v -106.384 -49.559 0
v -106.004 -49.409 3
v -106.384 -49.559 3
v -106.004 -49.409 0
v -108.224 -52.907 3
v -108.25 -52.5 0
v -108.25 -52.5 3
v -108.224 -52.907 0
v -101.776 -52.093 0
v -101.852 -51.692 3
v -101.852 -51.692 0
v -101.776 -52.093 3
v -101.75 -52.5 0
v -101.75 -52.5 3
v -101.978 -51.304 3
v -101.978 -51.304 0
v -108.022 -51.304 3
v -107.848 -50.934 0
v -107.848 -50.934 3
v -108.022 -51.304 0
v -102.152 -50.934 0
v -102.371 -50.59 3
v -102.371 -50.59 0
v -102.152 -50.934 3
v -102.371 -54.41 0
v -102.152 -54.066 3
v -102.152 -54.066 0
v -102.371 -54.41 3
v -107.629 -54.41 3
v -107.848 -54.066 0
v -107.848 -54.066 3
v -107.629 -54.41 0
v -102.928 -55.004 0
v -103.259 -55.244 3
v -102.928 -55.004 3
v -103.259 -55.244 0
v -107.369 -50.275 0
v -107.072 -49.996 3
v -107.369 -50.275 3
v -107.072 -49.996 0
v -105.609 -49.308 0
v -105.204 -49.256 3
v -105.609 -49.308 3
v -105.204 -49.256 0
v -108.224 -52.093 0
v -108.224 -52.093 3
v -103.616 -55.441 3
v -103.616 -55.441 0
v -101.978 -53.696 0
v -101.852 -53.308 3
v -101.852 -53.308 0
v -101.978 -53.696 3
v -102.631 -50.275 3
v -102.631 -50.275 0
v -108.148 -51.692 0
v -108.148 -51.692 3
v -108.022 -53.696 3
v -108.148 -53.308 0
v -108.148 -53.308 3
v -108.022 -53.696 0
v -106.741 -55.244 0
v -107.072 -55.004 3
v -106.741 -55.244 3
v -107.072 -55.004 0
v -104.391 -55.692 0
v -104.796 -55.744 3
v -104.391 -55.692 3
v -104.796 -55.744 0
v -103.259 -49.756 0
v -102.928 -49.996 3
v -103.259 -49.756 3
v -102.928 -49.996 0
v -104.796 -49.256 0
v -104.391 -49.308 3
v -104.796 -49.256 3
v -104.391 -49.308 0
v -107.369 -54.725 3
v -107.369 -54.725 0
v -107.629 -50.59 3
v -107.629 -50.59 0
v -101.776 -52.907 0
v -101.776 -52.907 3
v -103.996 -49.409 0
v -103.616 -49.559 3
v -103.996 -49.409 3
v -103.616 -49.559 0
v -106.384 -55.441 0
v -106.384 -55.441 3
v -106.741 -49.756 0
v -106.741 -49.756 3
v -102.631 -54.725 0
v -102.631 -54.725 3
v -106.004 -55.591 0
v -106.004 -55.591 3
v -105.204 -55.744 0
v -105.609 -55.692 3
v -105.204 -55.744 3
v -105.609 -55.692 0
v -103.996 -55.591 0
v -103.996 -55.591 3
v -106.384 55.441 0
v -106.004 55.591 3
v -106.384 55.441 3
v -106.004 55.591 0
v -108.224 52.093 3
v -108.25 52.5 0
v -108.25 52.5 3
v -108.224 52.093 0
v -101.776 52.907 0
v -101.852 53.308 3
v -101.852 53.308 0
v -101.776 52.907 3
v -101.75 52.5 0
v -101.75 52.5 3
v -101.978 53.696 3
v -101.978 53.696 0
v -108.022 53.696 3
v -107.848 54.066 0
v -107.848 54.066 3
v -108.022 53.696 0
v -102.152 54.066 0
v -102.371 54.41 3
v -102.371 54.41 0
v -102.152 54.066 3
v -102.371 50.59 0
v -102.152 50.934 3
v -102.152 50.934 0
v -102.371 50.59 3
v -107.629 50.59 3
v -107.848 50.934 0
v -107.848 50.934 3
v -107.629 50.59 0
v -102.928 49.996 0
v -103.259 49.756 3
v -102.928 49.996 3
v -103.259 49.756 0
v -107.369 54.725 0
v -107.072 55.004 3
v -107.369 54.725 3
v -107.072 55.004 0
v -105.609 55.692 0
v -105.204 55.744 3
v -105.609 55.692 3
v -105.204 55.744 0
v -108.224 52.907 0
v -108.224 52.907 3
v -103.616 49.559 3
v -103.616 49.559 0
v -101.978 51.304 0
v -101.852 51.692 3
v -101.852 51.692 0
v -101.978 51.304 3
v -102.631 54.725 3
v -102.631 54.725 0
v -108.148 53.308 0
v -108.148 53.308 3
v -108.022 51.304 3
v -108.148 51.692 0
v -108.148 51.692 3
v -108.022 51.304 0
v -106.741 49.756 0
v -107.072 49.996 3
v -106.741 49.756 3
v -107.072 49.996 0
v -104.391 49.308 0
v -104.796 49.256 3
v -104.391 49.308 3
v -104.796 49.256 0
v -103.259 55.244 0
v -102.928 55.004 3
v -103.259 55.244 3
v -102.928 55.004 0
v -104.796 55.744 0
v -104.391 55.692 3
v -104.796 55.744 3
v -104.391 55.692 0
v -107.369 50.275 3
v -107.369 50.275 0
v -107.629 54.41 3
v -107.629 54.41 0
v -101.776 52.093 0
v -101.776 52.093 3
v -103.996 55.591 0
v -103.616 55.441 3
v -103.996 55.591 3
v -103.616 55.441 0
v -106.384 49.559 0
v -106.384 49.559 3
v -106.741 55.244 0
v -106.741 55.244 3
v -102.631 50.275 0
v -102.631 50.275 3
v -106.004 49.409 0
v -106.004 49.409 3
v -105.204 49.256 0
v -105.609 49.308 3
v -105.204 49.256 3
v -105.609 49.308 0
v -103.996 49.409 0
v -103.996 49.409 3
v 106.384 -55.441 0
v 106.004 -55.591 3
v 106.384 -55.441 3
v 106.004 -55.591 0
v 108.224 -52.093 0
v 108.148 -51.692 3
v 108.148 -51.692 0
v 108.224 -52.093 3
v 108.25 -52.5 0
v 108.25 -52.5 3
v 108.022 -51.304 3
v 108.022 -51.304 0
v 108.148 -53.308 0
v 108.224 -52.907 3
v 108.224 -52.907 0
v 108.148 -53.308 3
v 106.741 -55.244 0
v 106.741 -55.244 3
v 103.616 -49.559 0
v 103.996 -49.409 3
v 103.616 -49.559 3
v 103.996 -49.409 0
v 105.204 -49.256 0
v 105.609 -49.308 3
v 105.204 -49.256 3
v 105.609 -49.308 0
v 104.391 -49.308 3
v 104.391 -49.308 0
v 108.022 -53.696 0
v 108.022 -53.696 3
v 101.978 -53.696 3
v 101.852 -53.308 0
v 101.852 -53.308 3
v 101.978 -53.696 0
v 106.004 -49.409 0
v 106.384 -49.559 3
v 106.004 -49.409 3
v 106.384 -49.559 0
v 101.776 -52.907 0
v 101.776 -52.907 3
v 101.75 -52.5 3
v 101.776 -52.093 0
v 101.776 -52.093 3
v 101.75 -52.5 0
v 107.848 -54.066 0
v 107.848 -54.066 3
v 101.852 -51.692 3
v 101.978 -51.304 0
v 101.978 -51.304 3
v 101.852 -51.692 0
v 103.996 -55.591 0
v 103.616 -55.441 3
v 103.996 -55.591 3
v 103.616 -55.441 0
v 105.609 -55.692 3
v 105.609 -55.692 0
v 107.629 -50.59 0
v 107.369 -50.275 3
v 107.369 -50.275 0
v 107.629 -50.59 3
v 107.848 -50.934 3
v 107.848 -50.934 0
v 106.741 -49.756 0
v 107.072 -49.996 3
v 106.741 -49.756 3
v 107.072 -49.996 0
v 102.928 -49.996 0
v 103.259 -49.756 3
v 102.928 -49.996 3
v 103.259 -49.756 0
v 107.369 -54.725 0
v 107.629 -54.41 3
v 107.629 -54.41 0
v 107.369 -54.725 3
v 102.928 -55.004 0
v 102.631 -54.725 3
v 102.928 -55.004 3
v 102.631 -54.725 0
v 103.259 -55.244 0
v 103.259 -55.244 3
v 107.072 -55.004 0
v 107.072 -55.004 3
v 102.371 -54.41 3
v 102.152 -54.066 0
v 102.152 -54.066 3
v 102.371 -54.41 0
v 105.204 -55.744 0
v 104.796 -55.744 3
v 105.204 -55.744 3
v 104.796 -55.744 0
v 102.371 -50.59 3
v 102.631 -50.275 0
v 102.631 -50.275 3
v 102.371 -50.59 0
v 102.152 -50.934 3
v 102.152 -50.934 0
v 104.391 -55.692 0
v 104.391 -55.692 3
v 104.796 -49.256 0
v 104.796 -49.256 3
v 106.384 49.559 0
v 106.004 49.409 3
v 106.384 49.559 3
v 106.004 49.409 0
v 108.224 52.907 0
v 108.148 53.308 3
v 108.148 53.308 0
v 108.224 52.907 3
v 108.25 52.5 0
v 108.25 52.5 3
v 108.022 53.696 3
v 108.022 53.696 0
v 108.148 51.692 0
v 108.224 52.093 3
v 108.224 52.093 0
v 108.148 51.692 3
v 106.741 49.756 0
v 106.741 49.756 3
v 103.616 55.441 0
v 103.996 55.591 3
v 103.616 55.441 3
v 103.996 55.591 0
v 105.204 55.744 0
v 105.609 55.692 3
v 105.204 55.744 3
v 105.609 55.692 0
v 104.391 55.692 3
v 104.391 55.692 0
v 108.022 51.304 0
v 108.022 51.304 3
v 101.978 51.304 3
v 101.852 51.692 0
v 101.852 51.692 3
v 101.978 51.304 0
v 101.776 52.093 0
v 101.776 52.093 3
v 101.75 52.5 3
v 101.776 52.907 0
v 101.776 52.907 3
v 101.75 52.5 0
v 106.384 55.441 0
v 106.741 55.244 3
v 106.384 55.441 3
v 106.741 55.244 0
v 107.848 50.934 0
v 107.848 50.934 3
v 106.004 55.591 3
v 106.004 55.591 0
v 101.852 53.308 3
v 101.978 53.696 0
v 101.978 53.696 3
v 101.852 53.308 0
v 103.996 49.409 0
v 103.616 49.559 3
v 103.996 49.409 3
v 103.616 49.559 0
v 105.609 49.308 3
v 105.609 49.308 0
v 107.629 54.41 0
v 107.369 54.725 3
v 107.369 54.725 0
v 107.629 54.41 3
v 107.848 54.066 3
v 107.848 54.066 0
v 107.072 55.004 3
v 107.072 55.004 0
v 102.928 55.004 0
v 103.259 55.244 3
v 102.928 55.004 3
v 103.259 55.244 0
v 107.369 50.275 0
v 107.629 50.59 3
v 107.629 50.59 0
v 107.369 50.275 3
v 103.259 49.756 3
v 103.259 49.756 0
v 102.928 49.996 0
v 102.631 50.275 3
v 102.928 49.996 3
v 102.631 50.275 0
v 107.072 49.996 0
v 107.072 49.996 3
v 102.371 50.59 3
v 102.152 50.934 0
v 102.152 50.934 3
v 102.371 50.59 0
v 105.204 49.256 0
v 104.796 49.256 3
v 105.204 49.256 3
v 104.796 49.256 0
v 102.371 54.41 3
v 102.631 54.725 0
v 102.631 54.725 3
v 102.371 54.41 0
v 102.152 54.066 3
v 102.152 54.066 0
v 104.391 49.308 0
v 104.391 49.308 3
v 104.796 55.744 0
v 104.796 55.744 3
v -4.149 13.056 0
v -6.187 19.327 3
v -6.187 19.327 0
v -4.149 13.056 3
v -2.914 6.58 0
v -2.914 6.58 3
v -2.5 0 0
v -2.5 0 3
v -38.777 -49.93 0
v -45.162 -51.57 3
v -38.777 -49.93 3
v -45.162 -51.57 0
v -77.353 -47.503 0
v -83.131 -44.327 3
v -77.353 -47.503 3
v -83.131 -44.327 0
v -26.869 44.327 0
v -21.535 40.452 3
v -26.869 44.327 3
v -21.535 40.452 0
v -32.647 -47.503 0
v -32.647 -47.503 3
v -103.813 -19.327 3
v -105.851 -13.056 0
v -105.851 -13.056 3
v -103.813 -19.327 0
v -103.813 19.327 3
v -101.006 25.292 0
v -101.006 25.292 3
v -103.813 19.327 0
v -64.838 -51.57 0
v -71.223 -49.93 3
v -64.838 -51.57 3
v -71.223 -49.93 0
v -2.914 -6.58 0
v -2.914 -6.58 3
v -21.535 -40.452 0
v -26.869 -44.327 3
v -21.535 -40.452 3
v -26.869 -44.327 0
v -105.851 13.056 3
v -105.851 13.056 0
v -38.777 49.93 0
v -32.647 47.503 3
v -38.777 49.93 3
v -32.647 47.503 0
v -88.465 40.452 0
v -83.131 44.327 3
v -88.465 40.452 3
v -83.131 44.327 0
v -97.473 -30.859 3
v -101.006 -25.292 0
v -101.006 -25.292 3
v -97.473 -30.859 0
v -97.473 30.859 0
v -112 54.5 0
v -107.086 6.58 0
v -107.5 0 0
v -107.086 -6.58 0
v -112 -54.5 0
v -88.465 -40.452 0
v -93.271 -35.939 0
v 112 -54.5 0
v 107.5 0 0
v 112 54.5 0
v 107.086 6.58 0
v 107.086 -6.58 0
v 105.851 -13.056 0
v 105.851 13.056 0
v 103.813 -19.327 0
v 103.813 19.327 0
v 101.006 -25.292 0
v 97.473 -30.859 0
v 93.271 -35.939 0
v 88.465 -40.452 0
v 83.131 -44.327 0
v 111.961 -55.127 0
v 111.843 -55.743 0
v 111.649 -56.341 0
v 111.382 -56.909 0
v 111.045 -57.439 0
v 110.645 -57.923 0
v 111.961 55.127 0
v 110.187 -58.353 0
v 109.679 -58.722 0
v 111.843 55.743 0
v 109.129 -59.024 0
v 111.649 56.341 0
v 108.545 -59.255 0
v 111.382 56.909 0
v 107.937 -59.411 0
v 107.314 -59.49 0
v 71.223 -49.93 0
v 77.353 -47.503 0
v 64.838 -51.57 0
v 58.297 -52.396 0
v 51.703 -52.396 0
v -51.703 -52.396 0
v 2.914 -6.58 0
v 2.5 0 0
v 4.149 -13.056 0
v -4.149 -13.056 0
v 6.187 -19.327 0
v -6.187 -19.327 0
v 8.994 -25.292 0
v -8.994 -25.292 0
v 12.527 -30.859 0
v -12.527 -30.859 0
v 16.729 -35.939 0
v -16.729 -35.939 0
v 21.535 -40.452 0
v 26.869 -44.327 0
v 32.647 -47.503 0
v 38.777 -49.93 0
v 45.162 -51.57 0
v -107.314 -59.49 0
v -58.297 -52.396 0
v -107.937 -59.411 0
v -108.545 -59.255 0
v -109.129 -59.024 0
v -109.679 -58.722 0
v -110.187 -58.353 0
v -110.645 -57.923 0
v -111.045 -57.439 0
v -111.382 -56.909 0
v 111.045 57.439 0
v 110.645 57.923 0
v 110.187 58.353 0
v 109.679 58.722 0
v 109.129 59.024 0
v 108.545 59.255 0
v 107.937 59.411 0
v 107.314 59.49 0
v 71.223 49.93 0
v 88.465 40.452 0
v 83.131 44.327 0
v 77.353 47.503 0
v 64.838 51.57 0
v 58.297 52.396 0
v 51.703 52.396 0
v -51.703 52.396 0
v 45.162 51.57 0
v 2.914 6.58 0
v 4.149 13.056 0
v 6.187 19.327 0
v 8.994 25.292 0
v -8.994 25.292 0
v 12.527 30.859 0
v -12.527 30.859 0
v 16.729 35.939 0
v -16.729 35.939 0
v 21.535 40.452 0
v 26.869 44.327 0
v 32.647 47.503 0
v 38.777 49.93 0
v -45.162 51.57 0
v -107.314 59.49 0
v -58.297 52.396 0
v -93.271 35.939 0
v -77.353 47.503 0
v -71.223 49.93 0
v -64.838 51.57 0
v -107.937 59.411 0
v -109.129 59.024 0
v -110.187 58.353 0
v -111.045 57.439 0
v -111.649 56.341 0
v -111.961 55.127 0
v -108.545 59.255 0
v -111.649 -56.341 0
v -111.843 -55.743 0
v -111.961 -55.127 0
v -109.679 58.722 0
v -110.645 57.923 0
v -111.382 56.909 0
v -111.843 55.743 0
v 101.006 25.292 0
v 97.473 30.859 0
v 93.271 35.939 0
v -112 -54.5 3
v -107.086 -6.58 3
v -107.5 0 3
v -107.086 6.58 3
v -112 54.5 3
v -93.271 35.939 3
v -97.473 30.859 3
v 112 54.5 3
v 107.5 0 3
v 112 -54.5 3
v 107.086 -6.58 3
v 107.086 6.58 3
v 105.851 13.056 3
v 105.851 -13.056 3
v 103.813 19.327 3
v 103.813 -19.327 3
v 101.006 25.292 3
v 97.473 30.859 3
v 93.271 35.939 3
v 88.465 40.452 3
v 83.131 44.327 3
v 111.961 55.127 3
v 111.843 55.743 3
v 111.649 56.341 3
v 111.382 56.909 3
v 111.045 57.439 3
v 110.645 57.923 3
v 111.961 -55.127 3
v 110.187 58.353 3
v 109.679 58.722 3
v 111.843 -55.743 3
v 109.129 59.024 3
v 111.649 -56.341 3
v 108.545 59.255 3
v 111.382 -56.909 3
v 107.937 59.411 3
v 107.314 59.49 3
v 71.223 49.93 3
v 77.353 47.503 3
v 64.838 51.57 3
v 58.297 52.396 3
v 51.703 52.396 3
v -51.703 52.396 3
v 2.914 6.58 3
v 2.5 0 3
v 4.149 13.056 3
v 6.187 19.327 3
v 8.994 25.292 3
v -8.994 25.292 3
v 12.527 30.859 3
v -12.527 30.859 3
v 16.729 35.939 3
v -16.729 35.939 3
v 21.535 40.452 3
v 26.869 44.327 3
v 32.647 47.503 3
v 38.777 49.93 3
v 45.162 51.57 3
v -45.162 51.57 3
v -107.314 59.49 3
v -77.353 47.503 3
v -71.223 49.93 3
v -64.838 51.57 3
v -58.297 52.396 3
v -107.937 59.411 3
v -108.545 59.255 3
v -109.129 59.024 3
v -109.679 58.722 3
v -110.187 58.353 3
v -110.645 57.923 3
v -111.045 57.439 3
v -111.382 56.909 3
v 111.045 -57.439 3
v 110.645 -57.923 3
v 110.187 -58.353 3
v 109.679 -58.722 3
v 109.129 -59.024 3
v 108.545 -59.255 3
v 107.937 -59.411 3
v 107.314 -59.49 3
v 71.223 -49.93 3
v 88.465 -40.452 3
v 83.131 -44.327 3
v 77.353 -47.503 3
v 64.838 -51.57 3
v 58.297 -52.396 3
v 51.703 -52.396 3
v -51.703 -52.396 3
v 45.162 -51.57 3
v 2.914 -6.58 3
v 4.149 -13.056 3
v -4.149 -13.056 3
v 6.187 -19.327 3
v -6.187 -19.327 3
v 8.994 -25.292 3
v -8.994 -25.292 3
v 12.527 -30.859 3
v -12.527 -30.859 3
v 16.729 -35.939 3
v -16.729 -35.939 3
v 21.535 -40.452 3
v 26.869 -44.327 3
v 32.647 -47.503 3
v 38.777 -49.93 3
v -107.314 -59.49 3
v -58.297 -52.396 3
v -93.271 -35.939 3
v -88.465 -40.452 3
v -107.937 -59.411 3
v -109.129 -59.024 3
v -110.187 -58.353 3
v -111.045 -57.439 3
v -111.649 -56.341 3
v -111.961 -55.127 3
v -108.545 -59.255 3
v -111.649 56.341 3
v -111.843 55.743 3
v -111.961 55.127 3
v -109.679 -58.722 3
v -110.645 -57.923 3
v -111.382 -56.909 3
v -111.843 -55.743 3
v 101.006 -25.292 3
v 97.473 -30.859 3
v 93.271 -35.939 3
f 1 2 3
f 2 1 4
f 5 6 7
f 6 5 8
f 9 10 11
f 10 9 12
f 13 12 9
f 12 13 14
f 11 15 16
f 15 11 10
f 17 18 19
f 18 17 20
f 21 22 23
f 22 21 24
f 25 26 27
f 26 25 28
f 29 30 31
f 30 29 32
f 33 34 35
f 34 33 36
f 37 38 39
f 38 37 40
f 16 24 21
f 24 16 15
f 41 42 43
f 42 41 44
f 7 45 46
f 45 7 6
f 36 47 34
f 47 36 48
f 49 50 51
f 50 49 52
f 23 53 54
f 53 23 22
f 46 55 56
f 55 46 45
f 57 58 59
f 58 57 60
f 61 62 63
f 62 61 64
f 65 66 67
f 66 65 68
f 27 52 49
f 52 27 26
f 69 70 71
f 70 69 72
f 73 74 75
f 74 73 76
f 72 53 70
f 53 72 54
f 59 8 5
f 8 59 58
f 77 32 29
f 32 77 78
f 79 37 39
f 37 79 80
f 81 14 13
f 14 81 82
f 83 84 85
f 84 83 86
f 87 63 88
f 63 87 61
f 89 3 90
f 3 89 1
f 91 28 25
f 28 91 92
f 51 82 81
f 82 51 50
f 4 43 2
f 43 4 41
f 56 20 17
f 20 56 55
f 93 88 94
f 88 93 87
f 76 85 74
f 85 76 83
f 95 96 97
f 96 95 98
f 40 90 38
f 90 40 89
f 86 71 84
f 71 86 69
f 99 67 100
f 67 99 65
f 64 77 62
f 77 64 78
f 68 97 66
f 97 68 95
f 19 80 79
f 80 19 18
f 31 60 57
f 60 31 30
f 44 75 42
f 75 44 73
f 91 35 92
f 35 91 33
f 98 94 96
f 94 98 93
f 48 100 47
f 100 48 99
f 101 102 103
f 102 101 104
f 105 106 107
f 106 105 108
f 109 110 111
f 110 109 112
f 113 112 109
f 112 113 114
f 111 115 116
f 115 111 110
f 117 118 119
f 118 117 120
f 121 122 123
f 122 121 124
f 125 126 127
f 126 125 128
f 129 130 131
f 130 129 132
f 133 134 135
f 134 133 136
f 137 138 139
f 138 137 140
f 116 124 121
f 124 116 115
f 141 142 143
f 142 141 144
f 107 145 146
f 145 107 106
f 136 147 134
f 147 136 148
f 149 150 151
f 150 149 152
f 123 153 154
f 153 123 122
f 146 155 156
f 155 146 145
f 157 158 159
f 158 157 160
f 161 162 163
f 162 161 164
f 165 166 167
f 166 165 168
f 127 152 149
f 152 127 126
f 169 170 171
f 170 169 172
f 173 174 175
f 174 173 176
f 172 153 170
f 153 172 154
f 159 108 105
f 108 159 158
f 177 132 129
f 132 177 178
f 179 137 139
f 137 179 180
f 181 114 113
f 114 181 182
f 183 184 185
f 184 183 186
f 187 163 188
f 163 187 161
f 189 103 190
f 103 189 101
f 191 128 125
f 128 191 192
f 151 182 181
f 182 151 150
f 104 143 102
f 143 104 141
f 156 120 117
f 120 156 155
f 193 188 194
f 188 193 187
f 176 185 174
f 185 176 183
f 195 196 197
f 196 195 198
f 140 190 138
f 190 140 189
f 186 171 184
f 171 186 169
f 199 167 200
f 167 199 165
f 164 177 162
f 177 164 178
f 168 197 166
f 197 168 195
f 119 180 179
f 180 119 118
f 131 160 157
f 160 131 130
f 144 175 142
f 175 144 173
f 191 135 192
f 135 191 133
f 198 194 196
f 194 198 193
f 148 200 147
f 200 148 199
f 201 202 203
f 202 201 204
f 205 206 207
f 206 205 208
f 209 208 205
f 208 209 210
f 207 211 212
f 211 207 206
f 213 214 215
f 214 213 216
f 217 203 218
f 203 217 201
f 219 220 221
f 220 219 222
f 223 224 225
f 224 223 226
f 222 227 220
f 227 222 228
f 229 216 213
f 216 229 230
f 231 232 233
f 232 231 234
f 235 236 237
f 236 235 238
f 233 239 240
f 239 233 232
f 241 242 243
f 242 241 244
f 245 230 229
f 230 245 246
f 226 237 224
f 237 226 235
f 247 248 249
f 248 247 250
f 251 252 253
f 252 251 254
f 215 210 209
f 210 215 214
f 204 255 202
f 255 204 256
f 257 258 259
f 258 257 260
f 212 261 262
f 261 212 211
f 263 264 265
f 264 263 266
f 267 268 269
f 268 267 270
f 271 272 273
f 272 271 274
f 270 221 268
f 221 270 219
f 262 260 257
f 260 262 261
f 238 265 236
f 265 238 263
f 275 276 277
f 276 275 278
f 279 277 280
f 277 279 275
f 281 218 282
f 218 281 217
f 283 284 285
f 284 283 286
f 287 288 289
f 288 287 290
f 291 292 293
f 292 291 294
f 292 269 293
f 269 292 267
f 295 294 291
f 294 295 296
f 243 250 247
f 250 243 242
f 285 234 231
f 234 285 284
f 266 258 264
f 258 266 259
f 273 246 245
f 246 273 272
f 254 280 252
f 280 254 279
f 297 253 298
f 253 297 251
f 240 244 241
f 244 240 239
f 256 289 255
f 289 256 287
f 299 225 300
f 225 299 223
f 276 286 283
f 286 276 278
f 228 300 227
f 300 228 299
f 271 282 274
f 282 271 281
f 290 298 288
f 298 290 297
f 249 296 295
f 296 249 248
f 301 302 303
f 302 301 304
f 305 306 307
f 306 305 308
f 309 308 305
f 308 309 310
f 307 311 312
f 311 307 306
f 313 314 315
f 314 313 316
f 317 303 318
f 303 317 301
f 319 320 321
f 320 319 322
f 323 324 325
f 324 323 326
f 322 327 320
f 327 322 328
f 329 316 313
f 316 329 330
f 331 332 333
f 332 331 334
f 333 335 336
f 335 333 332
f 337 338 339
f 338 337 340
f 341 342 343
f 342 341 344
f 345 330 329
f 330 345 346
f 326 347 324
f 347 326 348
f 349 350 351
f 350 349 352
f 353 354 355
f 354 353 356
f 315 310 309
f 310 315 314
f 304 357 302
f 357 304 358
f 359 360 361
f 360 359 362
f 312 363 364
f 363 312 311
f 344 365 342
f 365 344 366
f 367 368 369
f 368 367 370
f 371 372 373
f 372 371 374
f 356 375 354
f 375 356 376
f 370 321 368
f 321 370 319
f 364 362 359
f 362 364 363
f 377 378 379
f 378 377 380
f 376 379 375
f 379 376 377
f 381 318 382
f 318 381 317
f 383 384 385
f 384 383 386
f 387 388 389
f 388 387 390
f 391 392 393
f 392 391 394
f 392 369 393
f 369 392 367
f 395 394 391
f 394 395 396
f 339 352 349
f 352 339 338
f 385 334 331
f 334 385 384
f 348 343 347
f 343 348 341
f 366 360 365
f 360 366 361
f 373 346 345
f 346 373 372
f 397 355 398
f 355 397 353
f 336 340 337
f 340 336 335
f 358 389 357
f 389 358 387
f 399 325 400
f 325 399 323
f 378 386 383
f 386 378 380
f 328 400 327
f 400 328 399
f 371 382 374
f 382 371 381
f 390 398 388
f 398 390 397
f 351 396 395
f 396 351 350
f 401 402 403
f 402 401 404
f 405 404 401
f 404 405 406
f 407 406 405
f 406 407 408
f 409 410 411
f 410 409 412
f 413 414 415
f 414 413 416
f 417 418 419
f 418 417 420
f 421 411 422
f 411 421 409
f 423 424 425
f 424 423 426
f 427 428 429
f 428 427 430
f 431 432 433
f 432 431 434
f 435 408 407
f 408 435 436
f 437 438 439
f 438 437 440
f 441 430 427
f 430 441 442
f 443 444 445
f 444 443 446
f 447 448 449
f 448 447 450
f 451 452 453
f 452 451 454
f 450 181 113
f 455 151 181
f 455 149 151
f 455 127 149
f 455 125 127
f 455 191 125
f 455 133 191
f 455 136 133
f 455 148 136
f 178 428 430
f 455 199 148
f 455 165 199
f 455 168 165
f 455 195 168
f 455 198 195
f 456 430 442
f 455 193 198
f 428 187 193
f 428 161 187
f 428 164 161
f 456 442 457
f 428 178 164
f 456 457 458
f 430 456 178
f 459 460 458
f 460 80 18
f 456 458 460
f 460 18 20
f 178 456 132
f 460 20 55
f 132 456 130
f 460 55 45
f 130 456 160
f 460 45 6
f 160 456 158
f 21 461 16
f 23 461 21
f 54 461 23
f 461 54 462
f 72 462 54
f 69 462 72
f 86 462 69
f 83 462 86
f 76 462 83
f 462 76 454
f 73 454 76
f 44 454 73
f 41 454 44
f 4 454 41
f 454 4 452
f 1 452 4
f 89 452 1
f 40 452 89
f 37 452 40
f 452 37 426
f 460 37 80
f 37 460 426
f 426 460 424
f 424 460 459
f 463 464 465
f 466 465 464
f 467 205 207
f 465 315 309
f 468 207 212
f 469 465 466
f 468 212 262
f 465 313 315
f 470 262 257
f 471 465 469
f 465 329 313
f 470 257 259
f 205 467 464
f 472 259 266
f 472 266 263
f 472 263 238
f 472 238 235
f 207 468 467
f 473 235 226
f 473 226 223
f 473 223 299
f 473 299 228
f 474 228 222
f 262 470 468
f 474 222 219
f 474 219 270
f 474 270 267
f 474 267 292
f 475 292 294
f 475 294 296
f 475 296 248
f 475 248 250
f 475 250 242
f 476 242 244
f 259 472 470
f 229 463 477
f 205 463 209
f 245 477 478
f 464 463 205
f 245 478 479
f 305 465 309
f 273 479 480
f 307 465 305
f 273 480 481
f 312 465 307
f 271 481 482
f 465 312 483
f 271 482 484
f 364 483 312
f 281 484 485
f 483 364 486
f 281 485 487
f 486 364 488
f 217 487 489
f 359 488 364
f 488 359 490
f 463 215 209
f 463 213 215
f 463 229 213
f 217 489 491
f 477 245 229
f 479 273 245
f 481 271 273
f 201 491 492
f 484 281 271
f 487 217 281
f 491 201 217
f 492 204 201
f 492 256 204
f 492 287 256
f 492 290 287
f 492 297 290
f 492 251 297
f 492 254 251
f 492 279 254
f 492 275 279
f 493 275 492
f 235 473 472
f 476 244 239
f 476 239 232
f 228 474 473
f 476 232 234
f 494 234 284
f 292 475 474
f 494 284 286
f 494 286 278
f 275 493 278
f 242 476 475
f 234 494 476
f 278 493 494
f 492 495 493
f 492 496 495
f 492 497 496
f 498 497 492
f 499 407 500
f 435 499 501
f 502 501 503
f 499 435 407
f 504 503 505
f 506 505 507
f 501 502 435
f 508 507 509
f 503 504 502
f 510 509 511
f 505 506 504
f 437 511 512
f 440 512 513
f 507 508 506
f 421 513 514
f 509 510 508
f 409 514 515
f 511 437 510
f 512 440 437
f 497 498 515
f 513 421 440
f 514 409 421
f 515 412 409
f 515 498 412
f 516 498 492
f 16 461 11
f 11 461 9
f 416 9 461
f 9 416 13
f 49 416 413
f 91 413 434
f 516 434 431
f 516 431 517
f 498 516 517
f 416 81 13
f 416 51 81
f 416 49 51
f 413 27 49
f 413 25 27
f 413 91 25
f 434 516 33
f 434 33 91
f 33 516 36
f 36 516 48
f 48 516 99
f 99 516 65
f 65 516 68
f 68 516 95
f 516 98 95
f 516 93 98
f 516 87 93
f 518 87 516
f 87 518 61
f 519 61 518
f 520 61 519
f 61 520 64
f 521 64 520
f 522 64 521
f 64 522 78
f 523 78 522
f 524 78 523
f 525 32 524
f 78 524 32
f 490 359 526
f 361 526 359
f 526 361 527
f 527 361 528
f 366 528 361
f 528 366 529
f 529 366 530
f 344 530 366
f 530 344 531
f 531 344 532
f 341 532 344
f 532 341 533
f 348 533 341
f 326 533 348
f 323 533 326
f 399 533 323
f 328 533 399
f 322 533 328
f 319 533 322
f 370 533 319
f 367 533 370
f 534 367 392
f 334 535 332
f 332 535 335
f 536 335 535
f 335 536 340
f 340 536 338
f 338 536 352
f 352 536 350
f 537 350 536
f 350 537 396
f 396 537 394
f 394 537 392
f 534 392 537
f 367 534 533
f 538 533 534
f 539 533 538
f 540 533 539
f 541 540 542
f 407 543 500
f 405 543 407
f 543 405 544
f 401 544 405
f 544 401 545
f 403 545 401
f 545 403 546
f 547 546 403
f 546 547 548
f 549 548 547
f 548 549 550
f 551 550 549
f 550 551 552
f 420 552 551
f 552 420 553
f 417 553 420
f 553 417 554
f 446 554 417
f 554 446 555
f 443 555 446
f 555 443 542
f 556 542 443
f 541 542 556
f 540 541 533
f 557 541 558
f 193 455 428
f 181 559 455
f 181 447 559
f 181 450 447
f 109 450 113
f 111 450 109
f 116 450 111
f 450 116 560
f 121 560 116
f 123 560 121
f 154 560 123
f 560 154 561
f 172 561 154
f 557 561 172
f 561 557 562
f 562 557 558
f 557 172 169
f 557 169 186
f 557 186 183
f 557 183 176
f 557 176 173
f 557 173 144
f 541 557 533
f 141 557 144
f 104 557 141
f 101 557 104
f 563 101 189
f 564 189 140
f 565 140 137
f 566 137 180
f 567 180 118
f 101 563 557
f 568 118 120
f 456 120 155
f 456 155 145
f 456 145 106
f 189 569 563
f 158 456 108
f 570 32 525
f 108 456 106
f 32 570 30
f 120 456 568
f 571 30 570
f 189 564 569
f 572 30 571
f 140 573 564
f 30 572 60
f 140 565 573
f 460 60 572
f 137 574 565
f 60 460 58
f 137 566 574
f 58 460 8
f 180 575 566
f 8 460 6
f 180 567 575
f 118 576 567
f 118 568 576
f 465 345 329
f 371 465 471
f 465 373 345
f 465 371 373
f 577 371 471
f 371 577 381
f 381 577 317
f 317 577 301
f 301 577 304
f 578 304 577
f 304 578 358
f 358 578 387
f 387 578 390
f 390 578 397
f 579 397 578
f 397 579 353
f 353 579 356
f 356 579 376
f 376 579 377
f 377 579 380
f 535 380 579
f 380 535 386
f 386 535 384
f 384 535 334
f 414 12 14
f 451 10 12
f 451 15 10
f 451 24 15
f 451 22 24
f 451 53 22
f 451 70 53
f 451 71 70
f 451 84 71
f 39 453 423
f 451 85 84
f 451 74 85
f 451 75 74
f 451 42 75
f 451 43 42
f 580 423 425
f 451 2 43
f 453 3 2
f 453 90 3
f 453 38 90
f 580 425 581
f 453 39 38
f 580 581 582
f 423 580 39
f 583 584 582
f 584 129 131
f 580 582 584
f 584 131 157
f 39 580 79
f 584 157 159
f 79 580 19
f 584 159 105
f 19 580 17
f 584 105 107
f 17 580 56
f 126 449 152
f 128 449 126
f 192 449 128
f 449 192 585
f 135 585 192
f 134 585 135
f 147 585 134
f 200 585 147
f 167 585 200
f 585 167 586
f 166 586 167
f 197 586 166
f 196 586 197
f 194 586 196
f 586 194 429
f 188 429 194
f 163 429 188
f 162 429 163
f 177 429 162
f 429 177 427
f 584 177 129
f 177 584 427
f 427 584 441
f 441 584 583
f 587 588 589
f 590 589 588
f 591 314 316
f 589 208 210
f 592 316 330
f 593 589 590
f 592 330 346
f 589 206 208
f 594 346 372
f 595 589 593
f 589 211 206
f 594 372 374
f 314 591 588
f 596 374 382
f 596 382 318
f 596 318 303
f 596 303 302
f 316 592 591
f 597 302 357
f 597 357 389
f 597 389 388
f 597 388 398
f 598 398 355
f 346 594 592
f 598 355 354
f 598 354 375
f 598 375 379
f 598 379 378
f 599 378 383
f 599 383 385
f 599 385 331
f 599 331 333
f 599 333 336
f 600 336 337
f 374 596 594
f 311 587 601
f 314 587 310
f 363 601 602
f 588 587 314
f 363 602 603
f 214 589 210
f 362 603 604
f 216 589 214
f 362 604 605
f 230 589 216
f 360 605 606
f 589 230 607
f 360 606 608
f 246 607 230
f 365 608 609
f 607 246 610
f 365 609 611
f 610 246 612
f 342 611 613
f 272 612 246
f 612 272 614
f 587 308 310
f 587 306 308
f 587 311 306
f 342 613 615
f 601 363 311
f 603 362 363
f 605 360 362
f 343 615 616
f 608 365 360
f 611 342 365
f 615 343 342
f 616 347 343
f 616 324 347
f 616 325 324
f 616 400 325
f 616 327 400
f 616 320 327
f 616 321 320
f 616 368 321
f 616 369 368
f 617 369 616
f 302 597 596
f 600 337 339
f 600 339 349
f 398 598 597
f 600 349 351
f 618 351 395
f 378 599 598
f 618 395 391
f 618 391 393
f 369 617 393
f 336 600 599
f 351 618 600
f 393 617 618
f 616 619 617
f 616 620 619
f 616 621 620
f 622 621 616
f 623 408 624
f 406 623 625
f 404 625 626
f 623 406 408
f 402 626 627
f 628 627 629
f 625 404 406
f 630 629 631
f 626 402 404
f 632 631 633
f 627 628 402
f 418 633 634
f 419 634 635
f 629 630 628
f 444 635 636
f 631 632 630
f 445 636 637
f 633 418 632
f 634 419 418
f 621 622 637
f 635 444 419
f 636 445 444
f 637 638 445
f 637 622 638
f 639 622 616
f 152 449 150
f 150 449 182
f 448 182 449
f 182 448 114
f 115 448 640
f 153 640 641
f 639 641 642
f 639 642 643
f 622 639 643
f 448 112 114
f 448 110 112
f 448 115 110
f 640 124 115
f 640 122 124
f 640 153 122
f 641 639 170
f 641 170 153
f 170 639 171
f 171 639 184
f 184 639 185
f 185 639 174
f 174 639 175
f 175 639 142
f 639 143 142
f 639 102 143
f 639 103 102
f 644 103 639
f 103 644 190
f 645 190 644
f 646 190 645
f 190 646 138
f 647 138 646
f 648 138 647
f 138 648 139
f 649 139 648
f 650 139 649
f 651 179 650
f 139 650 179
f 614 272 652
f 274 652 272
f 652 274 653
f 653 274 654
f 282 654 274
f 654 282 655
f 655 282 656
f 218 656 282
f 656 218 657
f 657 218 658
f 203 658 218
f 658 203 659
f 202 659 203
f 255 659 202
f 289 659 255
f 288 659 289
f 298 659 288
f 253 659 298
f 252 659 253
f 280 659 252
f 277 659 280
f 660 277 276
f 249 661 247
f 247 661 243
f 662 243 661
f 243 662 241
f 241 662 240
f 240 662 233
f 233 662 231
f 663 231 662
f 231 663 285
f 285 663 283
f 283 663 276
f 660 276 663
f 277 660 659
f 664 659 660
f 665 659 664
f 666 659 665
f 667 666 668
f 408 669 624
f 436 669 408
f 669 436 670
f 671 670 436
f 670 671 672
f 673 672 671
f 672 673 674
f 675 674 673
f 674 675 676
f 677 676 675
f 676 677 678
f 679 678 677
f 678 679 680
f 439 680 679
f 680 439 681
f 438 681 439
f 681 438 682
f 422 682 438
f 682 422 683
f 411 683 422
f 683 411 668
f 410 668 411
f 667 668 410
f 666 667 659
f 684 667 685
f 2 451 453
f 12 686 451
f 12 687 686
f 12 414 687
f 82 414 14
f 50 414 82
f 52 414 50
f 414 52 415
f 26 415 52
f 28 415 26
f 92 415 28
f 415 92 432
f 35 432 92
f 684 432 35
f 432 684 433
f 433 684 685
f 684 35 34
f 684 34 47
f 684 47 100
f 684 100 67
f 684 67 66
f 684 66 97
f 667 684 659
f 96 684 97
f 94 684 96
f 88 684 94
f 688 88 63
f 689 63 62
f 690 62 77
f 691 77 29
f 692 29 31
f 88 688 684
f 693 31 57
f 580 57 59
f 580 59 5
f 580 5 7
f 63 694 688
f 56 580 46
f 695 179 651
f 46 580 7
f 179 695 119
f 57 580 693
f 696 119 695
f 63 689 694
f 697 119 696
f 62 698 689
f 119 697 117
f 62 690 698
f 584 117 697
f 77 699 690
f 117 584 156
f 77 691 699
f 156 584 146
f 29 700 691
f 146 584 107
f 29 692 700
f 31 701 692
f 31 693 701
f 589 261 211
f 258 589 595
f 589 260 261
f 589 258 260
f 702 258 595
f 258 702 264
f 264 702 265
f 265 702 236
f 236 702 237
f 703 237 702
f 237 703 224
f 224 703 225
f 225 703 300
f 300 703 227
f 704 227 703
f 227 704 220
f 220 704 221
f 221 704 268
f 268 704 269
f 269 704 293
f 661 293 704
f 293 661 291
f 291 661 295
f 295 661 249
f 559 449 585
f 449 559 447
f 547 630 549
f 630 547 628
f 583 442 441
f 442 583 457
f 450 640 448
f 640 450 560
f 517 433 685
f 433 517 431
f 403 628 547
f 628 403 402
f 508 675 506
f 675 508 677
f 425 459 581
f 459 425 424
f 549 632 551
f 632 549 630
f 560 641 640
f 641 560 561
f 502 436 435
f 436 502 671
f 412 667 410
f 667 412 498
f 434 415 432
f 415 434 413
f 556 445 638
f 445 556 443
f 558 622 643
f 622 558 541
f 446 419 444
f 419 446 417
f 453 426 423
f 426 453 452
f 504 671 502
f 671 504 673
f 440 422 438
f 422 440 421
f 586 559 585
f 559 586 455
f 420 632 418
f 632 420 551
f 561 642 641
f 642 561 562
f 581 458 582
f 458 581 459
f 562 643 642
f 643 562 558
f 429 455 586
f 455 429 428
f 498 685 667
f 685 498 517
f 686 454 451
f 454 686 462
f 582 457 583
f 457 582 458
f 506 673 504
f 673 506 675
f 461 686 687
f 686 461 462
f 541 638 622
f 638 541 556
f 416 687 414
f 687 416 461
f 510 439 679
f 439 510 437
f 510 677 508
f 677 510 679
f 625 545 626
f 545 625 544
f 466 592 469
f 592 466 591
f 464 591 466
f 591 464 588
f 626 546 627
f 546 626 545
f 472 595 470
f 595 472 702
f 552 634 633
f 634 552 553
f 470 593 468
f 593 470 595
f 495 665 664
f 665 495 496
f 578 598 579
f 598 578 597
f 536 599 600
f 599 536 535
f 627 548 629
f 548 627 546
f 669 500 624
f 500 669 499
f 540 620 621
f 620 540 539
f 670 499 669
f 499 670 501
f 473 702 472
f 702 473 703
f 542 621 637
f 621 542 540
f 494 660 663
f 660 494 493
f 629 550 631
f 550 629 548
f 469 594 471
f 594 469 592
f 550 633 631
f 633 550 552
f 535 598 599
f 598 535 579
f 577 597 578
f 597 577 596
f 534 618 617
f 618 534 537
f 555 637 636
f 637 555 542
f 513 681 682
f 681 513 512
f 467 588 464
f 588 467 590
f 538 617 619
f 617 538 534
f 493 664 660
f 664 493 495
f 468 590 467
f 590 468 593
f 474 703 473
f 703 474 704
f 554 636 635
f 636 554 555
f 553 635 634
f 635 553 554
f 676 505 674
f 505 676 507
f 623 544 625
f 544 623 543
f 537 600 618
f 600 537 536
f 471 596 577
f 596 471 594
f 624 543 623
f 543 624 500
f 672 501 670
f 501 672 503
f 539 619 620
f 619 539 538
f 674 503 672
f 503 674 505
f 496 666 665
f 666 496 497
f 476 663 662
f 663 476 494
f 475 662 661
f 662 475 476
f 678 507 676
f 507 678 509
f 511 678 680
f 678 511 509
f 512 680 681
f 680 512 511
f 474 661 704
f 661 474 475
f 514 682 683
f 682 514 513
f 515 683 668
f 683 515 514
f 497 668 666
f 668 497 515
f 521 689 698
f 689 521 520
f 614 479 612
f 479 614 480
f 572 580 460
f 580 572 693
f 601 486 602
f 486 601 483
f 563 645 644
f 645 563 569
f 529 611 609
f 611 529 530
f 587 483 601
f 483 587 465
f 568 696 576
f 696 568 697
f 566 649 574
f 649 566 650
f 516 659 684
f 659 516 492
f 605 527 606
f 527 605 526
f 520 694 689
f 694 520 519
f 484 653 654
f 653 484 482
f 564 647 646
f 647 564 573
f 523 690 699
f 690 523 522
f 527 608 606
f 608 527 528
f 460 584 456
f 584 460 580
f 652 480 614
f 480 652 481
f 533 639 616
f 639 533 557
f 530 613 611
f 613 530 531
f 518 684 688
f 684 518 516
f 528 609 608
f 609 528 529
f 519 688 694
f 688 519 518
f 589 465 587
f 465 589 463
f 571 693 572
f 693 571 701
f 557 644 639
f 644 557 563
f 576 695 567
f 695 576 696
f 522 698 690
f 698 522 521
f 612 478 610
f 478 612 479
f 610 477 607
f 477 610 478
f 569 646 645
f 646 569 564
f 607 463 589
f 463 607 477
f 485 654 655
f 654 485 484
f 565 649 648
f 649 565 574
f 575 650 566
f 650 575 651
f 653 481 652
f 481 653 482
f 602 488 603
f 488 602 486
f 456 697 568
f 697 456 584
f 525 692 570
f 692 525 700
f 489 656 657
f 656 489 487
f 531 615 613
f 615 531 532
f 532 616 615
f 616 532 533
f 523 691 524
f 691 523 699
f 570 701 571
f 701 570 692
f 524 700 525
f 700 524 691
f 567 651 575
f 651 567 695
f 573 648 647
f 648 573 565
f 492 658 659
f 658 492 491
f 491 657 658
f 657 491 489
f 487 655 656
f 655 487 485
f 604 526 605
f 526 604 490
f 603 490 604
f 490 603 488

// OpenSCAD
$fn = 50;


difference() {
	union() {
		hull() {
			translate(v = [-107.0000000000, 54.5000000000, 0]) {
				cylinder(h = 3, r = 5);
			}
			translate(v = [107.0000000000, 54.5000000000, 0]) {
				cylinder(h = 3, r = 5);
			}
			translate(v = [-107.0000000000, -54.5000000000, 0]) {
				cylinder(h = 3, r = 5);
			}
			translate(v = [107.0000000000, -54.5000000000, 0]) {
				cylinder(h = 3, r = 5);
			}
		}
	}
	union() {
		#translate(v = [-105.0000000000, -52.5000000000, -100.0000000000]) {
			cylinder(h = 200, r = 3.2500000000);
		}
		#translate(v = [-105.0000000000, 52.5000000000, -100.0000000000]) {
			cylinder(h = 200, r = 3.2500000000);
		}
		#translate(v = [105.0000000000, -52.5000000000, -100.0000000000]) {
			cylinder(h = 200, r = 3.2500000000);
		}
		#translate(v = [105.0000000000, 52.5000000000, -100.0000000000]) {
			cylinder(h = 200, r = 3.2500000000);
		}
		#translate(v = [-55.0000000000, 0, 0]) {
			cylinder(h = 3, r = 52.5000000000);
		}
		#translate(v = [55.0000000000, 0, 0]) {
			cylinder(h = 3, r = 52.5000000000);
		}
	}
}
